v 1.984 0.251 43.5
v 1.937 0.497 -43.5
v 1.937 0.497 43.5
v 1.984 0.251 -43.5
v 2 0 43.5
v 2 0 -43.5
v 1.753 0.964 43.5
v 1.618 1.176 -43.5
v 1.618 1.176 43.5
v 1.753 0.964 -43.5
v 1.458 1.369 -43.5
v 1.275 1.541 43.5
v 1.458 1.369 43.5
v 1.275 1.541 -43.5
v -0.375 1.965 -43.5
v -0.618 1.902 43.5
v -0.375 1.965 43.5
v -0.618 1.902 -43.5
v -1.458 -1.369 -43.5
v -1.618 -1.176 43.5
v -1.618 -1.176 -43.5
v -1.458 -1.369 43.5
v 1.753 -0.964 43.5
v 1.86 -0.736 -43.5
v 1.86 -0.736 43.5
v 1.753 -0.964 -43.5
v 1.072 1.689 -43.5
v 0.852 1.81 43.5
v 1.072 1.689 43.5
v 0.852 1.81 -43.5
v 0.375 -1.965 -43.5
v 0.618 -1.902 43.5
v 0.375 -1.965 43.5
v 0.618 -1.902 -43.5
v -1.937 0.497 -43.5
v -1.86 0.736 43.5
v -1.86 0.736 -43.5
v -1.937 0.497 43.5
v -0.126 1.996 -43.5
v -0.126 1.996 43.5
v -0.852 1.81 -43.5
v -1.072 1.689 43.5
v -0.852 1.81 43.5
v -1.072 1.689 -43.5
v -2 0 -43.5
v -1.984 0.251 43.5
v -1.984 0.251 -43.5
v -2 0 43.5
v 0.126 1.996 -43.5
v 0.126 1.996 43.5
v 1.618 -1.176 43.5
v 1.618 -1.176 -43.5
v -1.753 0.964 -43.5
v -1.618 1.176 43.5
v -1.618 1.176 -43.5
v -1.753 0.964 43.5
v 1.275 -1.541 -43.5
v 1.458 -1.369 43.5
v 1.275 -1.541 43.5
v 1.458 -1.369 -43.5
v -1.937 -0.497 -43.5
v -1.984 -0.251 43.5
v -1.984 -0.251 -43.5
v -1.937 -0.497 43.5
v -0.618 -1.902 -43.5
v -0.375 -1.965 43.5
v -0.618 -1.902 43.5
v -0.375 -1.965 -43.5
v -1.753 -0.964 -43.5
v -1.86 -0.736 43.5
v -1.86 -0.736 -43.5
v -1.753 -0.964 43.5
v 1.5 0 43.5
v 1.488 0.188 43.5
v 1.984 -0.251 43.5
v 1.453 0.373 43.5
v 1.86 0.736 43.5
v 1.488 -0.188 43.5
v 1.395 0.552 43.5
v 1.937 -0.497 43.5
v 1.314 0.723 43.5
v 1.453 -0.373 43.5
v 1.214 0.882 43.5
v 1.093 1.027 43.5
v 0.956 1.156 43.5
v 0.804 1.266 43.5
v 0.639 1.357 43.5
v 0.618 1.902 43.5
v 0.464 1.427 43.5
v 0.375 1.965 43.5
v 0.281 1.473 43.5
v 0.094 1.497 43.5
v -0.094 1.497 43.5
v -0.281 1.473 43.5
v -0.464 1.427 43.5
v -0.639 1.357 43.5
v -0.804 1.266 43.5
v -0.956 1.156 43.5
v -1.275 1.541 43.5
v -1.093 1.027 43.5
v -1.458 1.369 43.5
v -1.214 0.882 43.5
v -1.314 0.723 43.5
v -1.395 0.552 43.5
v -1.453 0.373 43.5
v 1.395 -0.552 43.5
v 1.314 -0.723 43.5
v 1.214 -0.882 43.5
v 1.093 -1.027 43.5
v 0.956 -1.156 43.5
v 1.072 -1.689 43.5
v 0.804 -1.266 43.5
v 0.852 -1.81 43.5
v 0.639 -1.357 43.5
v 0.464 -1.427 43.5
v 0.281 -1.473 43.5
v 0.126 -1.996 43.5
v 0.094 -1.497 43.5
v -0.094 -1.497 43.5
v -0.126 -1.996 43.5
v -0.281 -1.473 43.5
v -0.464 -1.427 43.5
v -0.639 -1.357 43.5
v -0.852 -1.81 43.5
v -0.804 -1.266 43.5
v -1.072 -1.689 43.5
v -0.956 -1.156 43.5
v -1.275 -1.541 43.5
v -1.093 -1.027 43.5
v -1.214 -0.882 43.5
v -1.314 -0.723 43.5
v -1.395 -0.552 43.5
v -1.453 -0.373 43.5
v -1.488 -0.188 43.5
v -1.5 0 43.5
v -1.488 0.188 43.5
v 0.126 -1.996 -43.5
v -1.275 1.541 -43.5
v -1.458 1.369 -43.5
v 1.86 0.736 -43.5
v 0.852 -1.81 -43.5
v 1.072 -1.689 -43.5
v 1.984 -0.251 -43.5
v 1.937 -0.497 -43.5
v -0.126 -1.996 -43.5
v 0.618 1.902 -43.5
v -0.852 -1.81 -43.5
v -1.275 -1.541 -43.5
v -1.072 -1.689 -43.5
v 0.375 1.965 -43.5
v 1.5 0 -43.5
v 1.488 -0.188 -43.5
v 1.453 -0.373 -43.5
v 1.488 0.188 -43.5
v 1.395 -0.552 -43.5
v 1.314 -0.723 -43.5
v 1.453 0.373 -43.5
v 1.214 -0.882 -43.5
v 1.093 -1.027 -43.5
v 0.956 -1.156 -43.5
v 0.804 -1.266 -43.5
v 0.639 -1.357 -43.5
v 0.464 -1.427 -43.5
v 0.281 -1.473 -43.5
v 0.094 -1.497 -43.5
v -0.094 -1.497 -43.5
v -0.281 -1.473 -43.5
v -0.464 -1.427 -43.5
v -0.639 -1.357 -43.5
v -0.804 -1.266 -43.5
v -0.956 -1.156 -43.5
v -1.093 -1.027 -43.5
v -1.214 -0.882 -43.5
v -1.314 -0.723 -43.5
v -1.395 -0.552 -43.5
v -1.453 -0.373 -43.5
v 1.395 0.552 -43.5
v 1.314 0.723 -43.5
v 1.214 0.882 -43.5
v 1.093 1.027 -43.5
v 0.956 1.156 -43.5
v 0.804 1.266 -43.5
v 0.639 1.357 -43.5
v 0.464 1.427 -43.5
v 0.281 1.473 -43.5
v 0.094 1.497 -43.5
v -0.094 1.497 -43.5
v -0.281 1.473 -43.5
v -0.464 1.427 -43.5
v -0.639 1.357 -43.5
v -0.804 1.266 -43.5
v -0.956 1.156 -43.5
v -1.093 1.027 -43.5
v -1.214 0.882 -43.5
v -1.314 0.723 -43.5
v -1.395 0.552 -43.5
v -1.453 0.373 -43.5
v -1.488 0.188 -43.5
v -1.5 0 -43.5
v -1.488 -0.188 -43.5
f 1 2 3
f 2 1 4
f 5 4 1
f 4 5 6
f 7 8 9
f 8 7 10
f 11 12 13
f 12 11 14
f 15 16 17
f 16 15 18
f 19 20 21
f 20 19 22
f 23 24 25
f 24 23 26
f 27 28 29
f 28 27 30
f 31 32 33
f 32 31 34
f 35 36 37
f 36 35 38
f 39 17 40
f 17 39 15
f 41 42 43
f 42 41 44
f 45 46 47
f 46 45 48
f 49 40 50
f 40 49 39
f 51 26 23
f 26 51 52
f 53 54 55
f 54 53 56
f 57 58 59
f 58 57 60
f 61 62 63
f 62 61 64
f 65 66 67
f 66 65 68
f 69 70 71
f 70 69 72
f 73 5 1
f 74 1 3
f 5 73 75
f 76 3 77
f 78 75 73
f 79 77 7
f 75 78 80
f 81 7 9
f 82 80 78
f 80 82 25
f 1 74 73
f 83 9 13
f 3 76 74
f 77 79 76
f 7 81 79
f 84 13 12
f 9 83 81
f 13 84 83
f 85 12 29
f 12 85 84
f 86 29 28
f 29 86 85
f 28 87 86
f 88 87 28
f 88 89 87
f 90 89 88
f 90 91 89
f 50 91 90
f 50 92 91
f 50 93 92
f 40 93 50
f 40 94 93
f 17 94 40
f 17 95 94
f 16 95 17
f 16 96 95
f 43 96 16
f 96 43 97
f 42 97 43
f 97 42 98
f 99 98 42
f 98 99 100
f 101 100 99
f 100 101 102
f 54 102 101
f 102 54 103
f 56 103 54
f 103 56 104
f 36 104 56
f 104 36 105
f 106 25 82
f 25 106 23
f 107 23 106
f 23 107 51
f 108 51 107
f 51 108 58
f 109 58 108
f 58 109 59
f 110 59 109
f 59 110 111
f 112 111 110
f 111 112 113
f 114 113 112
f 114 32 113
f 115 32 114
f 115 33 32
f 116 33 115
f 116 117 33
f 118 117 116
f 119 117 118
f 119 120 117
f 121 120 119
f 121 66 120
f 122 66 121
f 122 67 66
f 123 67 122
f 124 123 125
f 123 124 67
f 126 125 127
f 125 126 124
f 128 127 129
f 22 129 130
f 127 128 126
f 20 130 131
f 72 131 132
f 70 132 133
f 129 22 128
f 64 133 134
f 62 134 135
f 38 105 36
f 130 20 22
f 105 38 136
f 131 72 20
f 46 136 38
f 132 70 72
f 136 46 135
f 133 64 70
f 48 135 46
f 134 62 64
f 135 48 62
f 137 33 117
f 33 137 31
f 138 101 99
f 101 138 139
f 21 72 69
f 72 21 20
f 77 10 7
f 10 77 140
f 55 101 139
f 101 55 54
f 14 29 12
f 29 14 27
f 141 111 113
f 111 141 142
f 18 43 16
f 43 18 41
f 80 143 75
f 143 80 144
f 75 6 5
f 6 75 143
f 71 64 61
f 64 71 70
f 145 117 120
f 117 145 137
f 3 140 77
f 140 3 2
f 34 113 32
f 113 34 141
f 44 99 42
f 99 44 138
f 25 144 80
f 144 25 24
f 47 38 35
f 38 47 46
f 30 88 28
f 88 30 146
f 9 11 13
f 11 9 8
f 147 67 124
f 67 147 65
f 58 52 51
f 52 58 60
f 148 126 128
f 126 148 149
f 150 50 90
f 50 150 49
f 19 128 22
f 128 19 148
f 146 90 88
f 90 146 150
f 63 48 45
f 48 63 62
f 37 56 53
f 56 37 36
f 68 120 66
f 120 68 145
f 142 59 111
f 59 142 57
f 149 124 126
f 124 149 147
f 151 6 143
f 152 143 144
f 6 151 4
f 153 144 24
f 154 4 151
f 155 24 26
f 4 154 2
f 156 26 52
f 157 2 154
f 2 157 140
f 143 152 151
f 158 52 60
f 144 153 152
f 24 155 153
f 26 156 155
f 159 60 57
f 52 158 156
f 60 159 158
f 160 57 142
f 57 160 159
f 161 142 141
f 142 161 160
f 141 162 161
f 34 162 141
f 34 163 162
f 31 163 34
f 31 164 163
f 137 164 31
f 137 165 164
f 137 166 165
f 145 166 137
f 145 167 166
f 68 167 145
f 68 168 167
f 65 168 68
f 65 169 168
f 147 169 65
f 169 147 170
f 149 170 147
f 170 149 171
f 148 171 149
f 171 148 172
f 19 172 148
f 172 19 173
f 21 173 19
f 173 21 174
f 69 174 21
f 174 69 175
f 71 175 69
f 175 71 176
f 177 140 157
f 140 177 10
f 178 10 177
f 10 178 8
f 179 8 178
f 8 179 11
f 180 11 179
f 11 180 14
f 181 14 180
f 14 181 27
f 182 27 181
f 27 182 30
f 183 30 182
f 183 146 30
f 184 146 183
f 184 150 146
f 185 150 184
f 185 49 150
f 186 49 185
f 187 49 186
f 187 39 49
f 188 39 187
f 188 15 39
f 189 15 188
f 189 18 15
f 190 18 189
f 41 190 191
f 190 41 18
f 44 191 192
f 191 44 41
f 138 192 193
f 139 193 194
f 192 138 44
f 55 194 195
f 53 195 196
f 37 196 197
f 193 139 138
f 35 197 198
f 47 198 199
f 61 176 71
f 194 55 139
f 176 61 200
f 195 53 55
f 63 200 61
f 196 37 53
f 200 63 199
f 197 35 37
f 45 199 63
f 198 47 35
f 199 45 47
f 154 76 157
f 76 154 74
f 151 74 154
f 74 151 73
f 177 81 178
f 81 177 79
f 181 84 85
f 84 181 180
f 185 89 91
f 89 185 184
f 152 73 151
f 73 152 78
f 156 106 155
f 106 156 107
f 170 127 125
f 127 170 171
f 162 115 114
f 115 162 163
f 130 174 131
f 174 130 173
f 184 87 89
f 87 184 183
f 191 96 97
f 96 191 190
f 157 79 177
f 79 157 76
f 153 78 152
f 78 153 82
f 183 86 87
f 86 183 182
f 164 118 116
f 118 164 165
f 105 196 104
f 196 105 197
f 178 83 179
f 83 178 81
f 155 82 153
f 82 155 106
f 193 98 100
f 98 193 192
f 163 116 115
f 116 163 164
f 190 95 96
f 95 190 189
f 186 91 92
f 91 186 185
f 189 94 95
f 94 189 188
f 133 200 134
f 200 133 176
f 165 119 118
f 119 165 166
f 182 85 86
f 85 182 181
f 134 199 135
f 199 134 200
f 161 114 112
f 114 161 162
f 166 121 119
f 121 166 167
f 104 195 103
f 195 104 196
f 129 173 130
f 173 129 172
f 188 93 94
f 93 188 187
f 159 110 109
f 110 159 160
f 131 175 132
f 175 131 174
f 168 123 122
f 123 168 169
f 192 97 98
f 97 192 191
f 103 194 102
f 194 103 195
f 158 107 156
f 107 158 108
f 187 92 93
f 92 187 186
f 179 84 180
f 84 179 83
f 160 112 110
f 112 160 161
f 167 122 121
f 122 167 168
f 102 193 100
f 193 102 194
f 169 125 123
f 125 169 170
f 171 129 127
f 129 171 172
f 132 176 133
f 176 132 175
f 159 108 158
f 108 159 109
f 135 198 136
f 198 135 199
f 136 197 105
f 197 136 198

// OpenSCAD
$fn = 50;


difference() {
	union() {
		translate(v = [0, 0, -43.5000000000]) {
			cylinder(h = 87, r = 2.0000000000);
		}
	}
	union() {
		translate(v = [0, 0, -100.0000000000]) {
			cylinder(h = 200, r = 1.5000000000);
		}
	}
}
